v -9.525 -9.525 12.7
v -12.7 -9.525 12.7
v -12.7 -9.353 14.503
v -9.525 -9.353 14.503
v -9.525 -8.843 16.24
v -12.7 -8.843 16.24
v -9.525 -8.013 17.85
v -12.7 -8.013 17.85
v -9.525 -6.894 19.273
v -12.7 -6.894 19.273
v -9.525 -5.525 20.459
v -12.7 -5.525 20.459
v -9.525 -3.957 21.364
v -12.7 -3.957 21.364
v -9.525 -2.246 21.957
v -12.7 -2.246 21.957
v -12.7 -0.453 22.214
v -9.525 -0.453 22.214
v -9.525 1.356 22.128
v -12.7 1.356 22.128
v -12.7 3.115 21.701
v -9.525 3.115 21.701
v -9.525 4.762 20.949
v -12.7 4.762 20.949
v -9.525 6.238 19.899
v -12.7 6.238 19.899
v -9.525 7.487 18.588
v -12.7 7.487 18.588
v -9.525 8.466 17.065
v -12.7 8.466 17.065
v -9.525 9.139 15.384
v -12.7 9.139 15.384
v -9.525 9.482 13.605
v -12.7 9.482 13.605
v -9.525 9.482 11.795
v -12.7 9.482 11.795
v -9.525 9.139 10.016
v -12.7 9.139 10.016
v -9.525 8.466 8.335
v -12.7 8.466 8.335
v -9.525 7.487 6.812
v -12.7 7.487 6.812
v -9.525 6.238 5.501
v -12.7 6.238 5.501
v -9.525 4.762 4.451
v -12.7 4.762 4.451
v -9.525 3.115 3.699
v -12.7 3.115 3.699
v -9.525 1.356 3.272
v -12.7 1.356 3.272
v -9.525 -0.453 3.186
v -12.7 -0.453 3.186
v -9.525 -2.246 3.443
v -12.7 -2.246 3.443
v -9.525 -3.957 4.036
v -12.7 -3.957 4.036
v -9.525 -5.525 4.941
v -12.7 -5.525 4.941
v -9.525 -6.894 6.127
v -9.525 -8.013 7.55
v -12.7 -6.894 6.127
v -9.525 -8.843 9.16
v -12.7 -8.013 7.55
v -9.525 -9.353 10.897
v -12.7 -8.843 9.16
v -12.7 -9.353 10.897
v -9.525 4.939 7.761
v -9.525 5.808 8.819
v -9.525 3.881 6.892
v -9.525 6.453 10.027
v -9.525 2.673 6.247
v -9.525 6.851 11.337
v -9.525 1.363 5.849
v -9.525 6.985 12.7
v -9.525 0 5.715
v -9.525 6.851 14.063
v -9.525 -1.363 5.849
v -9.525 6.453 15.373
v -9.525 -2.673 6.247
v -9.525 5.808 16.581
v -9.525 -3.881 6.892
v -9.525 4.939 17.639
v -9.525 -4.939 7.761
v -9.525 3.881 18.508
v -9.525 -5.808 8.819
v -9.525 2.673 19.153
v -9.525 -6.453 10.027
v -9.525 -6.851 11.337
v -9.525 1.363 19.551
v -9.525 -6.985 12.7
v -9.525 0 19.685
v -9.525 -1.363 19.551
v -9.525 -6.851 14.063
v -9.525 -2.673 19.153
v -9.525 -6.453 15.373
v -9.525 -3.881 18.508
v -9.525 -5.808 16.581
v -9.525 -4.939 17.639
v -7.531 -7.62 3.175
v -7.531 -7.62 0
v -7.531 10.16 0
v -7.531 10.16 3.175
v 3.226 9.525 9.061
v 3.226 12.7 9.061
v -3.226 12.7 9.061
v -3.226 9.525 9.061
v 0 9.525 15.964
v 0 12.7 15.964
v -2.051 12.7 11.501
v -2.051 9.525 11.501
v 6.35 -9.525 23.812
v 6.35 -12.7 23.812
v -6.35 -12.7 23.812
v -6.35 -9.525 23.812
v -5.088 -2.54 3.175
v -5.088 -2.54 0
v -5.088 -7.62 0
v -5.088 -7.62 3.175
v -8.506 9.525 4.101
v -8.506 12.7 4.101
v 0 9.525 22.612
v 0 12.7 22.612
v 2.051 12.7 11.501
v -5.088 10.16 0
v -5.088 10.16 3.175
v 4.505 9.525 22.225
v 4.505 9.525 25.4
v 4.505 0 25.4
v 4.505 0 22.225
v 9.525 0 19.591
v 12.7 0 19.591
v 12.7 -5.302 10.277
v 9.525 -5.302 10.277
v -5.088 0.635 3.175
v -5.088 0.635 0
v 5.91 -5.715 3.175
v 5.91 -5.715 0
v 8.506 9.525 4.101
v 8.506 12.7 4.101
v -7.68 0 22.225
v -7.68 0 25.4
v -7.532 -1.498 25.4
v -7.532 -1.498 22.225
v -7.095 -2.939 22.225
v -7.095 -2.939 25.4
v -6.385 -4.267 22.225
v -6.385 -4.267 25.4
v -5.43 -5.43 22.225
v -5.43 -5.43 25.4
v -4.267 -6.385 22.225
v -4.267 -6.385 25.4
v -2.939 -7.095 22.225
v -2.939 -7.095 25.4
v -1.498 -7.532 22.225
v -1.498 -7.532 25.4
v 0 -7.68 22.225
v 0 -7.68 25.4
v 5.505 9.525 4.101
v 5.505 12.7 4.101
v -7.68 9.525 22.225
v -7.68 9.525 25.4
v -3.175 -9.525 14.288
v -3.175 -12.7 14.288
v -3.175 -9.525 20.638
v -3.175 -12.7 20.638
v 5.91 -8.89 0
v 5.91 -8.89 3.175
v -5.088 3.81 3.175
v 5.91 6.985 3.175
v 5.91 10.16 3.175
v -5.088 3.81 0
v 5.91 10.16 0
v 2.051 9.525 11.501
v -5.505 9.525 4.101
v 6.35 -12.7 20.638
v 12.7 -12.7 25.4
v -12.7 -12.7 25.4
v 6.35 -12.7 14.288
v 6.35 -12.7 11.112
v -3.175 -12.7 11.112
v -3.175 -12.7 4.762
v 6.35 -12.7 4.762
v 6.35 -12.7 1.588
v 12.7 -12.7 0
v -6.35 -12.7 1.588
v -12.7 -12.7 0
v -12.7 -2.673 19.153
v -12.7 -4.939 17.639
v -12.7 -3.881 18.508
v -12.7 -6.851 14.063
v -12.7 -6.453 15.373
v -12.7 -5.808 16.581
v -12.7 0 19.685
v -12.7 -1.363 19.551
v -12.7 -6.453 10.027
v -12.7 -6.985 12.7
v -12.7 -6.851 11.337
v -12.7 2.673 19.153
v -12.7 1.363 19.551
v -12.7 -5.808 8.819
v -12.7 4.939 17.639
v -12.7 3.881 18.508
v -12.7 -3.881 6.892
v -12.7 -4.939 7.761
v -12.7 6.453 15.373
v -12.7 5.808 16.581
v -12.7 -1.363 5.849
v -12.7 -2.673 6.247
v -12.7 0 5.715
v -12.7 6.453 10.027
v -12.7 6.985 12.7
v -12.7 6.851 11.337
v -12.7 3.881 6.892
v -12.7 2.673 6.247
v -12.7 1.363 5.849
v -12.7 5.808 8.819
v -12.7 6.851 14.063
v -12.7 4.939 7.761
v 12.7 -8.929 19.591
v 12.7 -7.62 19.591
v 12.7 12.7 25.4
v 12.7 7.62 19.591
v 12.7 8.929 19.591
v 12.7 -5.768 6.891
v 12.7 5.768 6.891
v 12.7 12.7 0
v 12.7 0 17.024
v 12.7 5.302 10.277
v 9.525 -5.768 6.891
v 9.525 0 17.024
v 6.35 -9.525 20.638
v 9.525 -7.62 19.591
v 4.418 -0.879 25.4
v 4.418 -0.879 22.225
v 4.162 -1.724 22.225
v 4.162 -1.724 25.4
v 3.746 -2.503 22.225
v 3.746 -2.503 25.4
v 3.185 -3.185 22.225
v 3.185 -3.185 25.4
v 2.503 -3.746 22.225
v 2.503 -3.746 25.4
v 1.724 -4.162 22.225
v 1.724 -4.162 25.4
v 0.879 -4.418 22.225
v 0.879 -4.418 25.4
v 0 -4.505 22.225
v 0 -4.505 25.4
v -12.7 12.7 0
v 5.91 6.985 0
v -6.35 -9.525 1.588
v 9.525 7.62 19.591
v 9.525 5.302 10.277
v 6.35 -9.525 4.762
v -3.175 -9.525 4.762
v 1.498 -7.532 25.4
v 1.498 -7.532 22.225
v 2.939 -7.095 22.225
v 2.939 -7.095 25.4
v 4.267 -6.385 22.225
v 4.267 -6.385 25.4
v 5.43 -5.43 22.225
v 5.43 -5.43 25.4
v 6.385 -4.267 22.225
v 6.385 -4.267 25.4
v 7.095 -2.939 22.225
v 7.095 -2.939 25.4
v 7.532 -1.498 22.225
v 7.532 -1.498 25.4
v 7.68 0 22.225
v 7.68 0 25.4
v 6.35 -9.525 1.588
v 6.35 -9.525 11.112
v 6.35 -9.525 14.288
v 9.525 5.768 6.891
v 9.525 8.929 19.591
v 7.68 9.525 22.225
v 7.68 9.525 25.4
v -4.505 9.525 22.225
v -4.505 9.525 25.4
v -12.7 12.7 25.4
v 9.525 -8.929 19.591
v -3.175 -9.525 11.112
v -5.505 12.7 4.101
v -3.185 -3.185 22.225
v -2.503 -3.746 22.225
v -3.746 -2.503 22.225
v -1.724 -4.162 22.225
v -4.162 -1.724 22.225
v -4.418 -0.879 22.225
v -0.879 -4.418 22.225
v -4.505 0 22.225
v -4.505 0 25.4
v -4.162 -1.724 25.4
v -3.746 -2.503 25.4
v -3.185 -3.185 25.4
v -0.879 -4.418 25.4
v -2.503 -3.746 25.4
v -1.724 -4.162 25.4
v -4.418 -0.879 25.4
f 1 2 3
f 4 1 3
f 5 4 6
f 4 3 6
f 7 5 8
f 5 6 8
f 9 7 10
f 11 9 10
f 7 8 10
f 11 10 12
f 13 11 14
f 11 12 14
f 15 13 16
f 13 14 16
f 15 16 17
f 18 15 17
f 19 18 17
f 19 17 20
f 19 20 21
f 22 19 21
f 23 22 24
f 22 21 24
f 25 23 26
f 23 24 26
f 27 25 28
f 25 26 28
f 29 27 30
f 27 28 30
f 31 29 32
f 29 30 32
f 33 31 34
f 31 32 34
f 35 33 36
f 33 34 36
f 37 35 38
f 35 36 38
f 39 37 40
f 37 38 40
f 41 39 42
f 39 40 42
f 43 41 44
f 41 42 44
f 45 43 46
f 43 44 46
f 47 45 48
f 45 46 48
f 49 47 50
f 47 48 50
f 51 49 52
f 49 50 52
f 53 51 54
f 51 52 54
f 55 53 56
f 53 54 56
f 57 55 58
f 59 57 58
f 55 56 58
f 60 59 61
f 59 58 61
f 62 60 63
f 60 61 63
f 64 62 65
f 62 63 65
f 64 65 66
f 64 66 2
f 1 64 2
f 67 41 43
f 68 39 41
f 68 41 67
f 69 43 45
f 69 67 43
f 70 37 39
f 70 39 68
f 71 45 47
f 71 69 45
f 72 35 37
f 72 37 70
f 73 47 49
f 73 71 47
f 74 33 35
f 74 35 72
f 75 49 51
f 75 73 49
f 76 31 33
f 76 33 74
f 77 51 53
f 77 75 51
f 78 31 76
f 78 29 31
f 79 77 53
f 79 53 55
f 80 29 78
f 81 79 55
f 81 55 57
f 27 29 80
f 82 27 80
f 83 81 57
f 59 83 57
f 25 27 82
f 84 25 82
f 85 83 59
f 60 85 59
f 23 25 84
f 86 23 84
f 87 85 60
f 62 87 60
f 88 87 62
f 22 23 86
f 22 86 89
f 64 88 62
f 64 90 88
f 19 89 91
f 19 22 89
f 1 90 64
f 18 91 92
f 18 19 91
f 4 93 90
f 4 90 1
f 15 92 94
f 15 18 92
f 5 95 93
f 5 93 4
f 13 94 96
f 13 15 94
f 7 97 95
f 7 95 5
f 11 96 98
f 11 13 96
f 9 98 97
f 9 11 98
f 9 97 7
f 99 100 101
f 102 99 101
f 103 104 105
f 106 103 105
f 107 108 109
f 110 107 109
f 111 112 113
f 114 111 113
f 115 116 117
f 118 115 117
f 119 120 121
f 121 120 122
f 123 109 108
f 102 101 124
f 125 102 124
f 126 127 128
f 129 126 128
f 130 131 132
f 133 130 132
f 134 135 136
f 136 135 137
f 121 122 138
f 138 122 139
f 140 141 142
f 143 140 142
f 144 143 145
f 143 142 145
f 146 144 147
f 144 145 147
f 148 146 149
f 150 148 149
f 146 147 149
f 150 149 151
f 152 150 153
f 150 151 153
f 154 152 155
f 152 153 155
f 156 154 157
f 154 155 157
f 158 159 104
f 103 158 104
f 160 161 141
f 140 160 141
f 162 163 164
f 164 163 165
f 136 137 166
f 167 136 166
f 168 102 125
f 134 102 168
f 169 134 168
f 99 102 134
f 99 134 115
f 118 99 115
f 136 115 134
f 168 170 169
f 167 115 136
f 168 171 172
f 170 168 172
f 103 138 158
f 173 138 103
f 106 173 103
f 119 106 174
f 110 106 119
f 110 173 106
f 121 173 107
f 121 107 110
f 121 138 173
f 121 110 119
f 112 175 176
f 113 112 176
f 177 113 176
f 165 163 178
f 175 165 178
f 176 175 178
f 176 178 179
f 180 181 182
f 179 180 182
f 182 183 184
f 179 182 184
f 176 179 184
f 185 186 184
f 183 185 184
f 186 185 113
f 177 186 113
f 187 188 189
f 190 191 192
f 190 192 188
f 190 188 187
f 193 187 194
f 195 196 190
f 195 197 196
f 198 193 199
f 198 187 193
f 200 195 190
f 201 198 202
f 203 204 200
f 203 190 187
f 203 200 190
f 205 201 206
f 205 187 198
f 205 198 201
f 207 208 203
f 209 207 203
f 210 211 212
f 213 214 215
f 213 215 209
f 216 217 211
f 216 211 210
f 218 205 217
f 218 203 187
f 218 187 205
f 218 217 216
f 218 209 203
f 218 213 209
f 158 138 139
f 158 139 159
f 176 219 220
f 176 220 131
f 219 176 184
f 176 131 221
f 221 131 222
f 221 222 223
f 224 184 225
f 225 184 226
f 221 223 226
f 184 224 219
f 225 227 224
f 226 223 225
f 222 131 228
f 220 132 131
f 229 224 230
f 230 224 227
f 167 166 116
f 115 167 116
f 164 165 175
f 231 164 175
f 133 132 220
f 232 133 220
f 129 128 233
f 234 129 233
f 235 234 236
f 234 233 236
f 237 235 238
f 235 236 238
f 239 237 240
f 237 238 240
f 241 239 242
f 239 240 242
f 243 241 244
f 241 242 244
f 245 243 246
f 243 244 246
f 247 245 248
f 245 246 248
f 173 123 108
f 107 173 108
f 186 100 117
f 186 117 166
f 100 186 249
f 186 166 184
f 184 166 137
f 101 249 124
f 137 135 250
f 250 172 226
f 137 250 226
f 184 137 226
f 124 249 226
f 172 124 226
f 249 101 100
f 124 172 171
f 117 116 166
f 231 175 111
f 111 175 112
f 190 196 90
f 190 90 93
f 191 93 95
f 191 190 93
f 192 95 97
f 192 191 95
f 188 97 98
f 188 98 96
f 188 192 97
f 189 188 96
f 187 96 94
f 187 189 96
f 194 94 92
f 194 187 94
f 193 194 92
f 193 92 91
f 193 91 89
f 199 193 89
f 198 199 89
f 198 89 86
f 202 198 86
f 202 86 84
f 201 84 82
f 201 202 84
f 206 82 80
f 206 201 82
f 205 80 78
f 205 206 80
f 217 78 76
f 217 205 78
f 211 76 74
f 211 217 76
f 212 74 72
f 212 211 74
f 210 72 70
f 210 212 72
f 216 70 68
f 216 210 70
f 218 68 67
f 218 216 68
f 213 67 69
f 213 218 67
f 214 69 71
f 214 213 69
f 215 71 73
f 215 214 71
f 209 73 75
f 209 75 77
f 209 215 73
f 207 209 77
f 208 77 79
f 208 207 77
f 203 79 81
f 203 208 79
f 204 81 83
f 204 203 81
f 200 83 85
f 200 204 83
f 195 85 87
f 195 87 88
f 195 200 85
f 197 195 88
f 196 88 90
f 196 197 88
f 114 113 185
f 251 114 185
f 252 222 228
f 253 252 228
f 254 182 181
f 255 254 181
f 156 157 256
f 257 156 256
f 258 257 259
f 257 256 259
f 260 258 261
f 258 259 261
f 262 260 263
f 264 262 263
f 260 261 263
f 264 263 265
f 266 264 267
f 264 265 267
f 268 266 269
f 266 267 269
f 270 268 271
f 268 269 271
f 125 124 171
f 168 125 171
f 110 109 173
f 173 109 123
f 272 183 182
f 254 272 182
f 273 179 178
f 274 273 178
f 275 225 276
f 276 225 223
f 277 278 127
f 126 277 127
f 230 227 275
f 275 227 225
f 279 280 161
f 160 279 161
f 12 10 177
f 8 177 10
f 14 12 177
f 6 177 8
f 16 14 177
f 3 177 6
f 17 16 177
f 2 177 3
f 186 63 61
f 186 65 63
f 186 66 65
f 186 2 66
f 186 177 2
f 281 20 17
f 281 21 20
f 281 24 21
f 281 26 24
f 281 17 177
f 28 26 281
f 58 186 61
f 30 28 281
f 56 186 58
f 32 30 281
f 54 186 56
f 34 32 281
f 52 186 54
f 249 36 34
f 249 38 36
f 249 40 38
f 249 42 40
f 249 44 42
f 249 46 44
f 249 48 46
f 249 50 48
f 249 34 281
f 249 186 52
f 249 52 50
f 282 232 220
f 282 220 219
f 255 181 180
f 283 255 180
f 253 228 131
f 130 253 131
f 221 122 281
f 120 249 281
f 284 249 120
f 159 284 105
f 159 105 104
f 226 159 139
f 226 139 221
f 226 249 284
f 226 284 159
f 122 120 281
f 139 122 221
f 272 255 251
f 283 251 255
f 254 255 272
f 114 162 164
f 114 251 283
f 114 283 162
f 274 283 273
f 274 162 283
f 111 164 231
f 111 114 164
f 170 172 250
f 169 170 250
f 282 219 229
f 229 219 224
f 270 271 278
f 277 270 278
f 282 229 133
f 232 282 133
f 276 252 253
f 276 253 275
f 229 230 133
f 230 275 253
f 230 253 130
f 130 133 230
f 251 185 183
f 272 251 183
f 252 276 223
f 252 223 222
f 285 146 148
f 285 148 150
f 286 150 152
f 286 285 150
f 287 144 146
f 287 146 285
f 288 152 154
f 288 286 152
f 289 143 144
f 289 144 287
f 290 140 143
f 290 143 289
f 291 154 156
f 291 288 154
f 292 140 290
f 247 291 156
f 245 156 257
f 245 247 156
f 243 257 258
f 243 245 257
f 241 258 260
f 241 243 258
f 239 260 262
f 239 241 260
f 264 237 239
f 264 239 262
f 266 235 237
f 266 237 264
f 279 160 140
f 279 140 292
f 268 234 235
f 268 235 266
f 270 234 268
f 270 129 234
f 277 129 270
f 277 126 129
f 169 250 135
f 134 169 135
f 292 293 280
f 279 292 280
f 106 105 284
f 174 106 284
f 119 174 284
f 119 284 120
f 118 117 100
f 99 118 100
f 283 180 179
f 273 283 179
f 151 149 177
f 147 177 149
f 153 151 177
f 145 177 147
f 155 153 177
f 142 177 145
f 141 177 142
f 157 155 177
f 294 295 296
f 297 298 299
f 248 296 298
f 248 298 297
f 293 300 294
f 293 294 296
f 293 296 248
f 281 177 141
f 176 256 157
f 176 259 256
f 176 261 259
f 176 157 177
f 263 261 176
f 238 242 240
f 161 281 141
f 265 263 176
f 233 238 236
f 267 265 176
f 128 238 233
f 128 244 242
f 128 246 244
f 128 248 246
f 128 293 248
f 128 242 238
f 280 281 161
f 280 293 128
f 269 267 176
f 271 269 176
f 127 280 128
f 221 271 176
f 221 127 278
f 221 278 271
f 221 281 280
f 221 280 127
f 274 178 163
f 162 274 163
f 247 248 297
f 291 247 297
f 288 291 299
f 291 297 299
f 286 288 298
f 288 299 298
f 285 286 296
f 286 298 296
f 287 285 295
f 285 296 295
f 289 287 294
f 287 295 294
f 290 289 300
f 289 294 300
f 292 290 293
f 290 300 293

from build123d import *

# Parameters (mm, degrees)
F0_W      = 25.4
F0_H      = 25.4
F1_DEPTH  = 25.4
F2_R      = 9.525
F2_R_2    = 6.985
F3_DEPTH  = 3.175
F5_DEPTH  = 3.175
F7_DEPTH  = 3.175
F9_DEPTH  = 3.175
F11_DEPTH = 3.175
F13_DEPTH = 3.175


with BuildPart() as f1:
    # F0 (on Top) → F1 (new body)
    with BuildSketch(Plane.XY):
        Rectangle(F0_W, F0_H)
    extrude(amount=F1_DEPTH)

    # F2 (on face) → F3 (cut)
    with BuildSketch(Plane(origin=(-12.7, 0, 0), x_dir=(0, -1, 0), z_dir=(-1, 0, 0))):
        with Locations((0, 12.7)):
            Circle(F2_R)
        with Locations((0, 12.7)):
            Circle(F2_R_2, mode=Mode.SUBTRACT)
    extrude(amount=-F3_DEPTH, mode=Mode.SUBTRACT)

    # F4 (on face) → F5 (cut)
    with BuildSketch(Plane(origin=(0, 12.7, 0), x_dir=(-1, 0, 0), z_dir=(0, 1, 0))):
        Polygon((8.506033, 4.101141), (0, 22.612056), (-8.506033, 4.101141), (-5.504938, 4.101141), (-3.2258, 9.061024), (0, 9.061024), (3.2258, 9.061024), (5.504938, 4.101141), align=None)
        Polygon((-2.050918, 11.50054), (0, 15.963769), (2.050918, 11.50054), (0, 11.50054), align=None, mode=Mode.SUBTRACT)
    extrude(amount=-F5_DEPTH, mode=Mode.SUBTRACT)

    # F6 (on face) → F7 (cut)
    with BuildSketch(Plane.YZ.offset(12.7)):
        Polygon((-7.62, 19.591412), (-8.928736, 19.591412), (-5.768185, 6.891412), (0, 17.024274), (5.768185, 6.891412), (8.928736, 19.591412), (7.62, 19.591412), (5.30208, 10.277347), (0, 19.591412), (-5.30208, 10.277347), align=None)
    extrude(amount=-F7_DEPTH, mode=Mode.SUBTRACT)

    # F8 (on face) → F9 (cut)
    with BuildSketch(Plane.XZ.offset(12.7)):
        Polygon((6.35, 23.8125), (-6.35, 23.8125), (-6.35, 1.5875), (6.35, 1.5875), (6.35, 4.7625), (-3.175, 4.7625), (-3.175, 11.1125), (6.35, 11.1125), (6.35, 14.2875), (-3.175, 14.2875), (-3.175, 20.6375), (6.35, 20.6375), align=None)
    extrude(amount=-F9_DEPTH, mode=Mode.SUBTRACT)

    # F10 (on face) → F11 (cut)
    with BuildSketch(Plane.XY.offset(25.4)):
        with BuildLine():
            Line((-4.504769, 9.525), (-7.679769, 9.525))
            Line((-7.679769, 9.525), (-7.679769, 0))
            ThreePointArc((-7.679769, 0), (-5.430417, -5.430417), (0, -7.679769))
            ThreePointArc((0, -7.679769), (5.430417, -5.430417), (7.679769, 0))
            Line((7.679769, 0), (7.679769, 9.525))
            Line((7.679769, 9.525), (4.504769, 9.525))
            Line((4.504769, 9.525), (4.504769, 0))
            ThreePointArc((4.504769, 0), (3.185353, -3.185353), (0, -4.504769))
            ThreePointArc((0, -4.504769), (-3.185353, -3.185353), (-4.504769, 0))
            Line((-4.504769, 0), (-4.504769, 9.525))
        make_face()
    extrude(amount=-F11_DEPTH, mode=Mode.SUBTRACT)

    # F12 (on face) → F13 (cut)
    with BuildSketch(Plane(origin=(0, 0, 0), x_dir=(1, 0, 0), z_dir=(0, 0, -1))):
        Polygon((-5.088263, 7.62), (-7.530533, 7.62), (-7.530533, -10.16), (-5.088263, -10.16), (-5.088263, -3.81), (5.910259, -10.16), (5.910259, -6.985), (-5.088263, -0.635), (5.910259, 5.715), (5.910259, 8.89), (-5.088263, 2.54), align=None)
    extrude(amount=-F13_DEPTH, mode=Mode.SUBTRACT)


solid = f1.part
